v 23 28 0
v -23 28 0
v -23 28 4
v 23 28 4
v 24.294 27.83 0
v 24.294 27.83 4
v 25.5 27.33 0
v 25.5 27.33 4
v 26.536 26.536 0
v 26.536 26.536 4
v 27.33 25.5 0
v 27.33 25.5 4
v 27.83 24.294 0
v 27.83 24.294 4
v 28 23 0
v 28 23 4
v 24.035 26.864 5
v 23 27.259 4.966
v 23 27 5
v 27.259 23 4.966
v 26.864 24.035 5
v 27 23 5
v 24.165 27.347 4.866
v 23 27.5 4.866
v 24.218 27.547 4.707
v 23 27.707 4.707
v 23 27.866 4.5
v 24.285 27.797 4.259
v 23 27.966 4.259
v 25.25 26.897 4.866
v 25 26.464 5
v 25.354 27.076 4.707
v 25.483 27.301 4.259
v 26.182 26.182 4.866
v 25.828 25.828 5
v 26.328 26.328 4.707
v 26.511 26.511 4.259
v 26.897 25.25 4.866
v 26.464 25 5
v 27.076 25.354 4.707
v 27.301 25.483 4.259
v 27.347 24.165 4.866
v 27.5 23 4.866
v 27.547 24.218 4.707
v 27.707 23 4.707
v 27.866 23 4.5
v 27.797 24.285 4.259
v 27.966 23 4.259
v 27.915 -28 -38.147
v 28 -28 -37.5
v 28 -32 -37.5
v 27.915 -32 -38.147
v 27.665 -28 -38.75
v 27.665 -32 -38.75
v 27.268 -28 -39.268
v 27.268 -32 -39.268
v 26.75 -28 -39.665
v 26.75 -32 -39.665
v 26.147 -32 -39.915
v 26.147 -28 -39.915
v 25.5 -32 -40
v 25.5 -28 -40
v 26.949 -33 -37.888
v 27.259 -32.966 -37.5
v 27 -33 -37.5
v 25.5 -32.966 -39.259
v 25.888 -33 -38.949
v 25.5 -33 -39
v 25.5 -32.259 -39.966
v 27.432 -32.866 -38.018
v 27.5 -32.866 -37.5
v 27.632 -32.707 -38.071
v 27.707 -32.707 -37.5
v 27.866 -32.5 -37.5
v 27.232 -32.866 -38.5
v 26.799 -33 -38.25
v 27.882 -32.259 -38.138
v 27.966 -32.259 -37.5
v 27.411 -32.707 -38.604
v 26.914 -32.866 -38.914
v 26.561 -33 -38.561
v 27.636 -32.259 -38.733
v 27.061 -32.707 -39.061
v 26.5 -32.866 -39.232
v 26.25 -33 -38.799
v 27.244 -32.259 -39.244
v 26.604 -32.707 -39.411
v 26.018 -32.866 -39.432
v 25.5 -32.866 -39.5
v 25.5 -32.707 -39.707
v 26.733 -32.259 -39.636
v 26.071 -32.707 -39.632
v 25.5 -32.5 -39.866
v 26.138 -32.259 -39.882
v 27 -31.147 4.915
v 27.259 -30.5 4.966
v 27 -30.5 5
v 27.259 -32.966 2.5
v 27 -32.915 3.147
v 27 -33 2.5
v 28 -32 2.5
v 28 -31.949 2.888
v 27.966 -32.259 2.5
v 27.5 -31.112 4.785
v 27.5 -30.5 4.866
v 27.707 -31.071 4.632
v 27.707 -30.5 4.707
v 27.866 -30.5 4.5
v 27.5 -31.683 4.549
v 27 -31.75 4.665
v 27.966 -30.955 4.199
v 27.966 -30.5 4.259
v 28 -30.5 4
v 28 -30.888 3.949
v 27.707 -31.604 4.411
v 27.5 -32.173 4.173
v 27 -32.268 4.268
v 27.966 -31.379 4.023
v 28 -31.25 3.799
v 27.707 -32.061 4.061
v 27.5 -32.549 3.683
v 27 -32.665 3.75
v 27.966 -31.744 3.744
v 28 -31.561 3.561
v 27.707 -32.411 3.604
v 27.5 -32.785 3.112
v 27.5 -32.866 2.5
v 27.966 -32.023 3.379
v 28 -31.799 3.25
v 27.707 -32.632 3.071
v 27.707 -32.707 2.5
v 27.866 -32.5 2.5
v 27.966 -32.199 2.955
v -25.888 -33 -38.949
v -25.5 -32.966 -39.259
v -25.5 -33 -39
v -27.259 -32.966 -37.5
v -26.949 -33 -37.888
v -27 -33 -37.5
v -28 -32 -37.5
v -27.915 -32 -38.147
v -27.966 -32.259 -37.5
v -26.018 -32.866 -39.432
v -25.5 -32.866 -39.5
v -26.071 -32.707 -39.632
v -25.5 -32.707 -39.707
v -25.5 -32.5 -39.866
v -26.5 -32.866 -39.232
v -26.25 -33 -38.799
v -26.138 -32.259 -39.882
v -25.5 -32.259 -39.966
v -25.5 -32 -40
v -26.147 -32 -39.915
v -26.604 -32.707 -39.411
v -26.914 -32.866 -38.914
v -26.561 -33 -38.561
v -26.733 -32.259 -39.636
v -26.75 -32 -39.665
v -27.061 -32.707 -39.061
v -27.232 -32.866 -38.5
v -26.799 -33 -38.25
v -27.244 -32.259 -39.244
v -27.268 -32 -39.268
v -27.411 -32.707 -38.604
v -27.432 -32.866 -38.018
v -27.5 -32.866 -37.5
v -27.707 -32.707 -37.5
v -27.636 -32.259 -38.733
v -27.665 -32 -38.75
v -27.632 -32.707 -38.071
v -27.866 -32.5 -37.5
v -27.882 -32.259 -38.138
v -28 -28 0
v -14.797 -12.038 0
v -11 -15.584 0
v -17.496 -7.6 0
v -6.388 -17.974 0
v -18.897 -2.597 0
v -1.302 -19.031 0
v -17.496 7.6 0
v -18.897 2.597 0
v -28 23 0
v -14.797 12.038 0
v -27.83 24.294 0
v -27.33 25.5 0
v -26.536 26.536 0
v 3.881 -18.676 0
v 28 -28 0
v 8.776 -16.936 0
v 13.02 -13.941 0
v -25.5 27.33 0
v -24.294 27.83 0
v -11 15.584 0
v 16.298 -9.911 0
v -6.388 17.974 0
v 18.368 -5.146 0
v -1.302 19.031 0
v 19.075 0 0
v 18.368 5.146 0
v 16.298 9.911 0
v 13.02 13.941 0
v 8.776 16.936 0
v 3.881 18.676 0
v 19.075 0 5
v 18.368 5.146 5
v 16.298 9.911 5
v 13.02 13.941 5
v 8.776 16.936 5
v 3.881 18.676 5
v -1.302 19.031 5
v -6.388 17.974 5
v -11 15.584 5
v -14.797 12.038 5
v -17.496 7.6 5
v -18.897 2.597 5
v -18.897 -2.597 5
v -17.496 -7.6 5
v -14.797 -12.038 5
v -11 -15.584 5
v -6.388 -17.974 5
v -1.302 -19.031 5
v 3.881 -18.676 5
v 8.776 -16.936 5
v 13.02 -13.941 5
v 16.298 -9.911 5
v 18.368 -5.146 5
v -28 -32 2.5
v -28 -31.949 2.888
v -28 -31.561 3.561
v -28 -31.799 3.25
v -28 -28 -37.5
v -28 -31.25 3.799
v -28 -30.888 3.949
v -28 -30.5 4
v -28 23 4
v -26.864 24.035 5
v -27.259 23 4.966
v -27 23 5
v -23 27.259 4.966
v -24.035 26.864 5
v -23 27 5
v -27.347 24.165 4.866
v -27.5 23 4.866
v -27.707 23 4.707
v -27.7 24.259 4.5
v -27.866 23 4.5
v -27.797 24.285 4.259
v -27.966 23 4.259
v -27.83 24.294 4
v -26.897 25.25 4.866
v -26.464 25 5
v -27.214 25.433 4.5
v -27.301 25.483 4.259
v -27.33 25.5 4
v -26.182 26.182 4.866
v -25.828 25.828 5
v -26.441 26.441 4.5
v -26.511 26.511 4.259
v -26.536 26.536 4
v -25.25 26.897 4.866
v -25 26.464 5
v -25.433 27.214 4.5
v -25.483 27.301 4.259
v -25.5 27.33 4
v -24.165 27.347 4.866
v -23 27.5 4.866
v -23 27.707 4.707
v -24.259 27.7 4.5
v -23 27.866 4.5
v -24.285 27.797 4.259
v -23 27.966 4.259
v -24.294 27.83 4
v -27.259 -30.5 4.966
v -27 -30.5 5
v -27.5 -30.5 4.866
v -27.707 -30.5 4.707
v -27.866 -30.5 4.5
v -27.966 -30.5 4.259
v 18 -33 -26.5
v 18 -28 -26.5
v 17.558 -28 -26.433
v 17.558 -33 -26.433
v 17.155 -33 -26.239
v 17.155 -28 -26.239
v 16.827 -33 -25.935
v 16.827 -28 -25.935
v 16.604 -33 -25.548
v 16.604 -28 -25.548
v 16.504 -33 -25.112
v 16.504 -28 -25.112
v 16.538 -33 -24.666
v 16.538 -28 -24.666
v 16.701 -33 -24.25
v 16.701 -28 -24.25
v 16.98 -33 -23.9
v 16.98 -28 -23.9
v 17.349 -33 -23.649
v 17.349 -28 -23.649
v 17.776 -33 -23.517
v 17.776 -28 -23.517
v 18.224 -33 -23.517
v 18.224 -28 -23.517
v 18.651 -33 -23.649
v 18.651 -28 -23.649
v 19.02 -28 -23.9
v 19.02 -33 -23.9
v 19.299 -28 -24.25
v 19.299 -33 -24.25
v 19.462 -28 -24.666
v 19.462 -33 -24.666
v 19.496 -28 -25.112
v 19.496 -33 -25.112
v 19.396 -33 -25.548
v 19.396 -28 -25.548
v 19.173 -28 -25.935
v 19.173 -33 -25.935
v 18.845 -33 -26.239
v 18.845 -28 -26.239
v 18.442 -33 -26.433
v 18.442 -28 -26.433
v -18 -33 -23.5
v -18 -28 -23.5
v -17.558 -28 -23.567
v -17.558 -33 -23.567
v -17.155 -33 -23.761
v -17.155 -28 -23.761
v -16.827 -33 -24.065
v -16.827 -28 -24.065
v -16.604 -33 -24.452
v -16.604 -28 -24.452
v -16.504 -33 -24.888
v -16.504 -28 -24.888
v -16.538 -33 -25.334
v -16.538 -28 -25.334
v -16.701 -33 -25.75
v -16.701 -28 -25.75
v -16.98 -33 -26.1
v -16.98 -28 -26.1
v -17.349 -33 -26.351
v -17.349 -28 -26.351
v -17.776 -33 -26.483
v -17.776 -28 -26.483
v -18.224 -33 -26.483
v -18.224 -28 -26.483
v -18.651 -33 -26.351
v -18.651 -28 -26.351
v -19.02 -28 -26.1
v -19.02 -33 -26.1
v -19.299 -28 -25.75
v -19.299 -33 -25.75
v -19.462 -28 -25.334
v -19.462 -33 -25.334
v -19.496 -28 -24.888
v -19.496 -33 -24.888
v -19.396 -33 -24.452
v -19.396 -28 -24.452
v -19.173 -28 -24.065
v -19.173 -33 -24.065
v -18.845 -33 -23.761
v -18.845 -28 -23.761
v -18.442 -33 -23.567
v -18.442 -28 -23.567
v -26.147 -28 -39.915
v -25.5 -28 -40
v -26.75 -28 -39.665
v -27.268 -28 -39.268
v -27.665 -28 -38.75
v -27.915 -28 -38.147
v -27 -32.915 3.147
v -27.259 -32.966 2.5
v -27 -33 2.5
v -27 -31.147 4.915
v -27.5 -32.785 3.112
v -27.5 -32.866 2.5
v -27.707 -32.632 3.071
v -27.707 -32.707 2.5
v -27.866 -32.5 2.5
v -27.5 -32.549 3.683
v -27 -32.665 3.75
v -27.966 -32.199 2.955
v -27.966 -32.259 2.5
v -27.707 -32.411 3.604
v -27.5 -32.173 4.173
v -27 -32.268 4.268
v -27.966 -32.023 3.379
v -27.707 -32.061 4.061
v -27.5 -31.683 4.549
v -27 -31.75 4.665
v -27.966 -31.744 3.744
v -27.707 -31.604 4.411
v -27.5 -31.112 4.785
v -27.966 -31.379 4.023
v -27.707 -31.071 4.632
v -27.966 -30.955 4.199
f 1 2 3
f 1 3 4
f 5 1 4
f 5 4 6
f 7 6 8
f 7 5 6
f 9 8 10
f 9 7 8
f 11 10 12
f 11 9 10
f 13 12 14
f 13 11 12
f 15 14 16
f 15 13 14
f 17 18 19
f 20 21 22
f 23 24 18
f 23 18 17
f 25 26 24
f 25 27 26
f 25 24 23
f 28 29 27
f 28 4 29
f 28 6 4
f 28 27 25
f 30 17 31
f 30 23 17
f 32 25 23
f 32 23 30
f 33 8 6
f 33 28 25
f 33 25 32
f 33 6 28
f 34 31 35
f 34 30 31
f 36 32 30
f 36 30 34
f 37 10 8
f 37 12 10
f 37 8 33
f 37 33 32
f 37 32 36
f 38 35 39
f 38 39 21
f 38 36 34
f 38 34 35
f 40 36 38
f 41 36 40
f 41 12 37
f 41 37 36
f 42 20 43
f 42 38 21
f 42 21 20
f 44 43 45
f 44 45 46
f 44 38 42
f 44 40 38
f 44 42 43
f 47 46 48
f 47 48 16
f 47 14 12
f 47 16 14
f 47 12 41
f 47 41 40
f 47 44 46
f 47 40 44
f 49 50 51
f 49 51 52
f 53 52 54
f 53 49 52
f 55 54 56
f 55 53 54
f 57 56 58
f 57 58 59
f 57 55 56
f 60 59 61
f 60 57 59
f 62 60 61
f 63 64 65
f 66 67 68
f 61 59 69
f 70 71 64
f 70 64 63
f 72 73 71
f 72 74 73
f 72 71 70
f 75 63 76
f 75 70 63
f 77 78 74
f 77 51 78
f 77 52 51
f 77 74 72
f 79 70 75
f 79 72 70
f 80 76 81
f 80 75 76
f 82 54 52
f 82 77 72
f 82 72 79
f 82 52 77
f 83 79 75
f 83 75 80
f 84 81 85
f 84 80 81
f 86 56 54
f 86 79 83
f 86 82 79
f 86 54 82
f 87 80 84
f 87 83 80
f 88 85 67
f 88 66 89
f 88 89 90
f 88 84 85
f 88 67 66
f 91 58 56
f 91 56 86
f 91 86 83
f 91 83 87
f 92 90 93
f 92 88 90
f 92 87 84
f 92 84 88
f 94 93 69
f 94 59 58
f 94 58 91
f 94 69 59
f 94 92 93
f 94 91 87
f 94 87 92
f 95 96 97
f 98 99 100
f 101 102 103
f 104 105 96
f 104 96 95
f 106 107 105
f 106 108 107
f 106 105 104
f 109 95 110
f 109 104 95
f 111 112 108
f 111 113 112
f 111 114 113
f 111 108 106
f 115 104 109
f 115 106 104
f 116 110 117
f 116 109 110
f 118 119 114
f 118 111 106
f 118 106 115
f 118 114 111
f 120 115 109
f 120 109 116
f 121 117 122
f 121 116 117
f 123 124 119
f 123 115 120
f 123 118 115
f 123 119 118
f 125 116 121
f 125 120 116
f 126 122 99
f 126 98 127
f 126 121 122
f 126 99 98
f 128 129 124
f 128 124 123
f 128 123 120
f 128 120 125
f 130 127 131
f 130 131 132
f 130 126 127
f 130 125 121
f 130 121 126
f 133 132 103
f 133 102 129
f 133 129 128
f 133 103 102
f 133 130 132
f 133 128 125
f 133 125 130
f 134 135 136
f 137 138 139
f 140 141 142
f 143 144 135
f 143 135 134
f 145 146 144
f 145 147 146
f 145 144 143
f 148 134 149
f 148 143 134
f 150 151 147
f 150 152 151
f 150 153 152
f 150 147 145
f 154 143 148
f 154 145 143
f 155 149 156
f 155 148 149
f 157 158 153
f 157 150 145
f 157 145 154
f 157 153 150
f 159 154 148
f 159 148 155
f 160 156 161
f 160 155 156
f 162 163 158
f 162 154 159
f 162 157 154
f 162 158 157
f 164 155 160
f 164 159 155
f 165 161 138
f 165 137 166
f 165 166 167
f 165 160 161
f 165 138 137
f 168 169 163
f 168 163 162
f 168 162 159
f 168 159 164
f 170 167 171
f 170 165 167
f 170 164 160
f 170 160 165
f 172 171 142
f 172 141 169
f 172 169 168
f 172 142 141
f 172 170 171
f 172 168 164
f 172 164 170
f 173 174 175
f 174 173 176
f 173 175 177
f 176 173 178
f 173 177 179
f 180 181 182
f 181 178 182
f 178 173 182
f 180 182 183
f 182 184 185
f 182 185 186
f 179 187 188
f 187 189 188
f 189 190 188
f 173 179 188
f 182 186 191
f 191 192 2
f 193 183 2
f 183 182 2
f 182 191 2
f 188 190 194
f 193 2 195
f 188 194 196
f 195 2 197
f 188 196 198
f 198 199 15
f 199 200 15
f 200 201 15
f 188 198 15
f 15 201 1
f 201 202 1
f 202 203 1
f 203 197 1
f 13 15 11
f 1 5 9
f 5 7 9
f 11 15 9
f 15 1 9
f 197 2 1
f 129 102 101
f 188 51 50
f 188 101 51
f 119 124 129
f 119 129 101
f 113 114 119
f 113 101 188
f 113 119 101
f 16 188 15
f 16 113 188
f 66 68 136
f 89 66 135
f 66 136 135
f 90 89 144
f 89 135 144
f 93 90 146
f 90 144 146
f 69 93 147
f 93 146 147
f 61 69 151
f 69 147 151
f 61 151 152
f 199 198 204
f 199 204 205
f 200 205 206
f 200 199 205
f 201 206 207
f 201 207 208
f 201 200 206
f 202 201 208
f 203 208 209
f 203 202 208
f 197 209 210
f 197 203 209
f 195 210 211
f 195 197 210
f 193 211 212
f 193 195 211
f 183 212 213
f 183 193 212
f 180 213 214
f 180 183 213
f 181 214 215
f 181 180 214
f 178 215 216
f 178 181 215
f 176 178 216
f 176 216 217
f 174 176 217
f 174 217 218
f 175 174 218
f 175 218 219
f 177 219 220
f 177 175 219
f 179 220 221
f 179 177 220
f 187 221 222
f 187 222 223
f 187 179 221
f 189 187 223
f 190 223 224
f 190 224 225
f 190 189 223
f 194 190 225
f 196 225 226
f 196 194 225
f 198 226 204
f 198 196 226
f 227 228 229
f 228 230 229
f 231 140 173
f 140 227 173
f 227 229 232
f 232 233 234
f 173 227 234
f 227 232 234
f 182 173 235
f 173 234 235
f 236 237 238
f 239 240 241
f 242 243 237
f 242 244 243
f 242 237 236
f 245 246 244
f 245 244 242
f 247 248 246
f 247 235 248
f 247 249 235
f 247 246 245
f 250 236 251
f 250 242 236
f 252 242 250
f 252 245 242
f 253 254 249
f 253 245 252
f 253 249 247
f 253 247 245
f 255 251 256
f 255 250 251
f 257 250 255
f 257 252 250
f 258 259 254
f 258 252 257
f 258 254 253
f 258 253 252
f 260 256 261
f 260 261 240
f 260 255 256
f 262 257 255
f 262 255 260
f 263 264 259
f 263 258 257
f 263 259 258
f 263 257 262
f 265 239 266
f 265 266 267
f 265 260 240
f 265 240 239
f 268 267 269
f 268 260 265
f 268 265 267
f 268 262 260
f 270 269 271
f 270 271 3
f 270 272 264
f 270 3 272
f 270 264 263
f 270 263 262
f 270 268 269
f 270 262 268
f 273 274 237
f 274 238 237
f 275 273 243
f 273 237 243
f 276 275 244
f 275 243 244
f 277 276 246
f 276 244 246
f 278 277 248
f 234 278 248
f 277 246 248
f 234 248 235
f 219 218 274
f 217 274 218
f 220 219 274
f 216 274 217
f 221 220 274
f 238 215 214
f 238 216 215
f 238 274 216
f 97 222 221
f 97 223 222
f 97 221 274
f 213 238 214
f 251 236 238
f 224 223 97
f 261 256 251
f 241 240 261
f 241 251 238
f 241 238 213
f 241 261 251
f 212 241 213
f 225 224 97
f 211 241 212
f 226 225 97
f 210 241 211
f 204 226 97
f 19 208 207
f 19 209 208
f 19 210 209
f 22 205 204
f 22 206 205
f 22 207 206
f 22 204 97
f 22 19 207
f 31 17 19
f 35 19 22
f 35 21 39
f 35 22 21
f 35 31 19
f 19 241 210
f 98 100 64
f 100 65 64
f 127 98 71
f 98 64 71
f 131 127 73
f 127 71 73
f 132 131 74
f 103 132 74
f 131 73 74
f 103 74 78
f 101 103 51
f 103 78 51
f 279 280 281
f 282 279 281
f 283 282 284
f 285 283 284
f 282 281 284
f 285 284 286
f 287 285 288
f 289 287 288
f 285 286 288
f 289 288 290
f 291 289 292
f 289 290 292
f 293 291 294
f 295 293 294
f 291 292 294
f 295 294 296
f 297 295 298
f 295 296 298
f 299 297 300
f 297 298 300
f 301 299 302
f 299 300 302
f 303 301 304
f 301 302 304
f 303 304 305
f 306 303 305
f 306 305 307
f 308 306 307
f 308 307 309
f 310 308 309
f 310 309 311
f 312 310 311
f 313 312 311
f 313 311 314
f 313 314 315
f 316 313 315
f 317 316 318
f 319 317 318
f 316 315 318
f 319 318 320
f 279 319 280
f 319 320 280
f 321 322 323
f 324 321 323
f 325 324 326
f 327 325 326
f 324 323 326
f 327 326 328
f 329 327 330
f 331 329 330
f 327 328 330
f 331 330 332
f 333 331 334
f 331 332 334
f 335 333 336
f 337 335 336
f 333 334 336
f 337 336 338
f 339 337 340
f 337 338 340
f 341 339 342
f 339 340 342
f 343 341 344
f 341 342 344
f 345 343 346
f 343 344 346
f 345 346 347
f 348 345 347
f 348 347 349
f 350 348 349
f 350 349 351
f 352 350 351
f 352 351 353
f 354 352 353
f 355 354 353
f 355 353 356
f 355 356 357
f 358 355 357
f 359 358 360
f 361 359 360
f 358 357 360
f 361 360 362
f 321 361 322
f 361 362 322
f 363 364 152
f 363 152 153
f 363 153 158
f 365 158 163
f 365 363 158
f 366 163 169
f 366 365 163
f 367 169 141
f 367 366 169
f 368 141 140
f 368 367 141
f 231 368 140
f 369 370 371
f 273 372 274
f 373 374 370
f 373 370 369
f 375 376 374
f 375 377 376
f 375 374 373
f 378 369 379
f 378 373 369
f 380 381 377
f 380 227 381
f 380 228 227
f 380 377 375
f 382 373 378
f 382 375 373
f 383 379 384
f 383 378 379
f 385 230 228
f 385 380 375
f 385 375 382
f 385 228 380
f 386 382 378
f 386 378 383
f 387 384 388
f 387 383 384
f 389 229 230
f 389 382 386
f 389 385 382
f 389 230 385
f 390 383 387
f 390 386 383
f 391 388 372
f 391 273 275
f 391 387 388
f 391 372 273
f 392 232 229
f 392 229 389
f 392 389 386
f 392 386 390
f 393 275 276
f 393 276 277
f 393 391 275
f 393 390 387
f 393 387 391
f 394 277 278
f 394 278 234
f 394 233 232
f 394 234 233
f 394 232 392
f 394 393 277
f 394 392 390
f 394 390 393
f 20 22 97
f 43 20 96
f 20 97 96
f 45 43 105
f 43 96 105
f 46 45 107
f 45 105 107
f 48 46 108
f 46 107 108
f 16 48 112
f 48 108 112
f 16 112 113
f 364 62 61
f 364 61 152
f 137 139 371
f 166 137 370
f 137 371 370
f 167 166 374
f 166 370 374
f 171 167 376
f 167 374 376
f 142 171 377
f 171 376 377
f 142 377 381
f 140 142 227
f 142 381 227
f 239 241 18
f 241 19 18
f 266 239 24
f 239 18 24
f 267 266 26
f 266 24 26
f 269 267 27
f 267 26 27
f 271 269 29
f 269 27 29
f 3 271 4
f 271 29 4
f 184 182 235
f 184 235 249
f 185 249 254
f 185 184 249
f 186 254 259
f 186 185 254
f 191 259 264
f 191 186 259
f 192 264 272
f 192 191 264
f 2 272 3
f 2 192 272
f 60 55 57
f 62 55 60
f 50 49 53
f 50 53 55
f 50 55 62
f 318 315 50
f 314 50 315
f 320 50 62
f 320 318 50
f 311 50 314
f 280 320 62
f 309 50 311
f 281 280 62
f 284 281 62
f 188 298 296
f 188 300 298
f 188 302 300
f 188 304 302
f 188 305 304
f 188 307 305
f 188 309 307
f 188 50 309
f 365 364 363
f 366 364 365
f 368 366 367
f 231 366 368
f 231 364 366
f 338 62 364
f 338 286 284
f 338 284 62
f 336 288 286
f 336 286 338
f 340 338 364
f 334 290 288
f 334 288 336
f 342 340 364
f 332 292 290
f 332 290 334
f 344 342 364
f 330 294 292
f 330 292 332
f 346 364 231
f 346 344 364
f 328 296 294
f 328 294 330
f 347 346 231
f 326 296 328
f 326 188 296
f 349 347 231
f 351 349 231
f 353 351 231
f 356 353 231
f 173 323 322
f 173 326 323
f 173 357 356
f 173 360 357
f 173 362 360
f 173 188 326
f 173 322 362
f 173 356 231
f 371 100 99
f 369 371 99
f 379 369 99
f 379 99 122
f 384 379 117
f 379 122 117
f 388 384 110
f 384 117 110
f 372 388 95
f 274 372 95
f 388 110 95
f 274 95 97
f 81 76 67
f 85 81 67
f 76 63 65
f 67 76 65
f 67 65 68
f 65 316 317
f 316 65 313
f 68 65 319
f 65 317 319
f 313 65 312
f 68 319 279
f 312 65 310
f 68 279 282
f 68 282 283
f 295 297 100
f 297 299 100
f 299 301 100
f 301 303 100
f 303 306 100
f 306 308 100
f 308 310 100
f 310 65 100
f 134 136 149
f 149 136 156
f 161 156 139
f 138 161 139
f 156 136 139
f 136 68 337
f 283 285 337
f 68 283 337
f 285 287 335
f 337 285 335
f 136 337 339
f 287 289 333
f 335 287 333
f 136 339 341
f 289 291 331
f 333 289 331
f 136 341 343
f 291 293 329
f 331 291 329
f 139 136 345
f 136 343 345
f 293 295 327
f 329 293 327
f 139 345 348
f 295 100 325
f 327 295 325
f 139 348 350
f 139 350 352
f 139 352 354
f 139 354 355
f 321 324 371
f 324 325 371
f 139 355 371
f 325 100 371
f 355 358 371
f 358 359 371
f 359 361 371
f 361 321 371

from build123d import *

# Parameters (mm, degrees)
ESQUISSE1_R             = 19.075
BOSS_EXTRU_2_DEPTH      = 5
ESQUISSE2_W             = 56
ESQUISSE2_H             = 5
BOSS_EXTRU_3_DEPTH      = 5
ESQUISSE3_W             = 56
ESQUISSE3_H             = 5
BOSS_EXTRU_4_DEPTH      = 50
CONG_1_R                = 2.5
ESQUISSE5_R             = 1.5
ENL_V_MAT_EXTRU_2_DEPTH = 5
ESQUISSE6_W             = 56
ESQUISSE6_H             = 5
ENL_V_MAT_EXTRU_3_DEPTH = 10
CONG_2_R                = 2.5
CONG_3_R                = 1


with BuildPart() as part:
    # Esquisse1 → Boss.-Extru.2 (new body)
    with BuildSketch(Plane.XY):
        with BuildLine():
            Line((-23, 28), (23, 28))
            ThreePointArc((23, 28), (26.535533906, 26.535533906), (28, 23))
            Line((28, 23), (28, -28))
            Line((28, -28), (-28, -28))
            Line((-28, -28), (-28, 23))
            ThreePointArc((-28, 23), (-26.535533906, 26.535533906), (-23, 28))
        make_face()
        Circle(ESQUISSE1_R, mode=Mode.SUBTRACT)
    extrude(amount=BOSS_EXTRU_2_DEPTH)

    # Esquisse2 → Boss.-Extru.3 (add)
    with BuildSketch(Plane.XZ.offset(28)):
        with Locations((0, 2.5)):
            Rectangle(ESQUISSE2_W, ESQUISSE2_H)
    extrude(amount=BOSS_EXTRU_3_DEPTH)

    # Esquisse3 → Boss.-Extru.4 (add)
    with BuildSketch(Plane(origin=(0, 0, 0), x_dir=(-1, 0, 0), z_dir=(0, 0, -1))):
        with Locations((0, -30.5)):
            Rectangle(ESQUISSE3_W, ESQUISSE3_H)
    extrude(amount=BOSS_EXTRU_4_DEPTH)

    # Congé1
    cong_1_edges = [part.edges().sort_by_distance(p)[0] for p in [
        (0, -33, 5),
    ]]
    fillet(cong_1_edges, radius=CONG_1_R)

    # Esquisse5 → Enlèv. mat.-Extru.2 (cut)
    with BuildSketch(Plane(origin=(0, -28, 0), x_dir=(1, 0, 0), z_dir=(0, 1, 0))):
        with Locations(Location((-18, 25, 0), (0, 0, 270))):
            Circle(ESQUISSE5_R)
        with Locations(Location((18, 25, 0), (0, 0, 90))):
            Circle(ESQUISSE5_R)
    extrude(amount=-ENL_V_MAT_EXTRU_2_DEPTH, mode=Mode.SUBTRACT)

    # Esquisse6 → Enlèv. mat.-Extru.3 (cut)
    with BuildSketch(Plane(origin=(0, 0, -50), x_dir=(-1, 0, 0), z_dir=(0, 0, -1))):
        with Locations((0, -30.5)):
            Rectangle(ESQUISSE6_W, ESQUISSE6_H)
    extrude(amount=-ENL_V_MAT_EXTRU_3_DEPTH, mode=Mode.SUBTRACT)

    # Congé2
    cong_2_edges = [part.edges().sort_by_distance(p)[0] for p in [
        (28, -30.5, -40),
        (-28, -30.5, -40),
    ]]
    fillet(cong_2_edges, radius=CONG_2_R)

    # Congé3
    cong_3_edges = [part.edges().sort_by_distance(p)[0] for p in [
        (0, 28, 5),
        (-26.535533906, 26.535533906, 5),
        (-28, -3.75, 5),
        (-28, -33, -17.5),
        (-28, -32.267766953, 4.267766953),
        (28, -3.75, 5),
        (28, -32.267766953, 4.267766953),
        (0, -33, -40),
        (26.535533906, 26.535533906, 5),
        (28, -33, -17.5),
        (27.267766953, -33, -39.267766953),
        (-27.267766953, -33, -39.267766953),
    ]]
    fillet(cong_3_edges, radius=CONG_3_R)


solid = part.part
